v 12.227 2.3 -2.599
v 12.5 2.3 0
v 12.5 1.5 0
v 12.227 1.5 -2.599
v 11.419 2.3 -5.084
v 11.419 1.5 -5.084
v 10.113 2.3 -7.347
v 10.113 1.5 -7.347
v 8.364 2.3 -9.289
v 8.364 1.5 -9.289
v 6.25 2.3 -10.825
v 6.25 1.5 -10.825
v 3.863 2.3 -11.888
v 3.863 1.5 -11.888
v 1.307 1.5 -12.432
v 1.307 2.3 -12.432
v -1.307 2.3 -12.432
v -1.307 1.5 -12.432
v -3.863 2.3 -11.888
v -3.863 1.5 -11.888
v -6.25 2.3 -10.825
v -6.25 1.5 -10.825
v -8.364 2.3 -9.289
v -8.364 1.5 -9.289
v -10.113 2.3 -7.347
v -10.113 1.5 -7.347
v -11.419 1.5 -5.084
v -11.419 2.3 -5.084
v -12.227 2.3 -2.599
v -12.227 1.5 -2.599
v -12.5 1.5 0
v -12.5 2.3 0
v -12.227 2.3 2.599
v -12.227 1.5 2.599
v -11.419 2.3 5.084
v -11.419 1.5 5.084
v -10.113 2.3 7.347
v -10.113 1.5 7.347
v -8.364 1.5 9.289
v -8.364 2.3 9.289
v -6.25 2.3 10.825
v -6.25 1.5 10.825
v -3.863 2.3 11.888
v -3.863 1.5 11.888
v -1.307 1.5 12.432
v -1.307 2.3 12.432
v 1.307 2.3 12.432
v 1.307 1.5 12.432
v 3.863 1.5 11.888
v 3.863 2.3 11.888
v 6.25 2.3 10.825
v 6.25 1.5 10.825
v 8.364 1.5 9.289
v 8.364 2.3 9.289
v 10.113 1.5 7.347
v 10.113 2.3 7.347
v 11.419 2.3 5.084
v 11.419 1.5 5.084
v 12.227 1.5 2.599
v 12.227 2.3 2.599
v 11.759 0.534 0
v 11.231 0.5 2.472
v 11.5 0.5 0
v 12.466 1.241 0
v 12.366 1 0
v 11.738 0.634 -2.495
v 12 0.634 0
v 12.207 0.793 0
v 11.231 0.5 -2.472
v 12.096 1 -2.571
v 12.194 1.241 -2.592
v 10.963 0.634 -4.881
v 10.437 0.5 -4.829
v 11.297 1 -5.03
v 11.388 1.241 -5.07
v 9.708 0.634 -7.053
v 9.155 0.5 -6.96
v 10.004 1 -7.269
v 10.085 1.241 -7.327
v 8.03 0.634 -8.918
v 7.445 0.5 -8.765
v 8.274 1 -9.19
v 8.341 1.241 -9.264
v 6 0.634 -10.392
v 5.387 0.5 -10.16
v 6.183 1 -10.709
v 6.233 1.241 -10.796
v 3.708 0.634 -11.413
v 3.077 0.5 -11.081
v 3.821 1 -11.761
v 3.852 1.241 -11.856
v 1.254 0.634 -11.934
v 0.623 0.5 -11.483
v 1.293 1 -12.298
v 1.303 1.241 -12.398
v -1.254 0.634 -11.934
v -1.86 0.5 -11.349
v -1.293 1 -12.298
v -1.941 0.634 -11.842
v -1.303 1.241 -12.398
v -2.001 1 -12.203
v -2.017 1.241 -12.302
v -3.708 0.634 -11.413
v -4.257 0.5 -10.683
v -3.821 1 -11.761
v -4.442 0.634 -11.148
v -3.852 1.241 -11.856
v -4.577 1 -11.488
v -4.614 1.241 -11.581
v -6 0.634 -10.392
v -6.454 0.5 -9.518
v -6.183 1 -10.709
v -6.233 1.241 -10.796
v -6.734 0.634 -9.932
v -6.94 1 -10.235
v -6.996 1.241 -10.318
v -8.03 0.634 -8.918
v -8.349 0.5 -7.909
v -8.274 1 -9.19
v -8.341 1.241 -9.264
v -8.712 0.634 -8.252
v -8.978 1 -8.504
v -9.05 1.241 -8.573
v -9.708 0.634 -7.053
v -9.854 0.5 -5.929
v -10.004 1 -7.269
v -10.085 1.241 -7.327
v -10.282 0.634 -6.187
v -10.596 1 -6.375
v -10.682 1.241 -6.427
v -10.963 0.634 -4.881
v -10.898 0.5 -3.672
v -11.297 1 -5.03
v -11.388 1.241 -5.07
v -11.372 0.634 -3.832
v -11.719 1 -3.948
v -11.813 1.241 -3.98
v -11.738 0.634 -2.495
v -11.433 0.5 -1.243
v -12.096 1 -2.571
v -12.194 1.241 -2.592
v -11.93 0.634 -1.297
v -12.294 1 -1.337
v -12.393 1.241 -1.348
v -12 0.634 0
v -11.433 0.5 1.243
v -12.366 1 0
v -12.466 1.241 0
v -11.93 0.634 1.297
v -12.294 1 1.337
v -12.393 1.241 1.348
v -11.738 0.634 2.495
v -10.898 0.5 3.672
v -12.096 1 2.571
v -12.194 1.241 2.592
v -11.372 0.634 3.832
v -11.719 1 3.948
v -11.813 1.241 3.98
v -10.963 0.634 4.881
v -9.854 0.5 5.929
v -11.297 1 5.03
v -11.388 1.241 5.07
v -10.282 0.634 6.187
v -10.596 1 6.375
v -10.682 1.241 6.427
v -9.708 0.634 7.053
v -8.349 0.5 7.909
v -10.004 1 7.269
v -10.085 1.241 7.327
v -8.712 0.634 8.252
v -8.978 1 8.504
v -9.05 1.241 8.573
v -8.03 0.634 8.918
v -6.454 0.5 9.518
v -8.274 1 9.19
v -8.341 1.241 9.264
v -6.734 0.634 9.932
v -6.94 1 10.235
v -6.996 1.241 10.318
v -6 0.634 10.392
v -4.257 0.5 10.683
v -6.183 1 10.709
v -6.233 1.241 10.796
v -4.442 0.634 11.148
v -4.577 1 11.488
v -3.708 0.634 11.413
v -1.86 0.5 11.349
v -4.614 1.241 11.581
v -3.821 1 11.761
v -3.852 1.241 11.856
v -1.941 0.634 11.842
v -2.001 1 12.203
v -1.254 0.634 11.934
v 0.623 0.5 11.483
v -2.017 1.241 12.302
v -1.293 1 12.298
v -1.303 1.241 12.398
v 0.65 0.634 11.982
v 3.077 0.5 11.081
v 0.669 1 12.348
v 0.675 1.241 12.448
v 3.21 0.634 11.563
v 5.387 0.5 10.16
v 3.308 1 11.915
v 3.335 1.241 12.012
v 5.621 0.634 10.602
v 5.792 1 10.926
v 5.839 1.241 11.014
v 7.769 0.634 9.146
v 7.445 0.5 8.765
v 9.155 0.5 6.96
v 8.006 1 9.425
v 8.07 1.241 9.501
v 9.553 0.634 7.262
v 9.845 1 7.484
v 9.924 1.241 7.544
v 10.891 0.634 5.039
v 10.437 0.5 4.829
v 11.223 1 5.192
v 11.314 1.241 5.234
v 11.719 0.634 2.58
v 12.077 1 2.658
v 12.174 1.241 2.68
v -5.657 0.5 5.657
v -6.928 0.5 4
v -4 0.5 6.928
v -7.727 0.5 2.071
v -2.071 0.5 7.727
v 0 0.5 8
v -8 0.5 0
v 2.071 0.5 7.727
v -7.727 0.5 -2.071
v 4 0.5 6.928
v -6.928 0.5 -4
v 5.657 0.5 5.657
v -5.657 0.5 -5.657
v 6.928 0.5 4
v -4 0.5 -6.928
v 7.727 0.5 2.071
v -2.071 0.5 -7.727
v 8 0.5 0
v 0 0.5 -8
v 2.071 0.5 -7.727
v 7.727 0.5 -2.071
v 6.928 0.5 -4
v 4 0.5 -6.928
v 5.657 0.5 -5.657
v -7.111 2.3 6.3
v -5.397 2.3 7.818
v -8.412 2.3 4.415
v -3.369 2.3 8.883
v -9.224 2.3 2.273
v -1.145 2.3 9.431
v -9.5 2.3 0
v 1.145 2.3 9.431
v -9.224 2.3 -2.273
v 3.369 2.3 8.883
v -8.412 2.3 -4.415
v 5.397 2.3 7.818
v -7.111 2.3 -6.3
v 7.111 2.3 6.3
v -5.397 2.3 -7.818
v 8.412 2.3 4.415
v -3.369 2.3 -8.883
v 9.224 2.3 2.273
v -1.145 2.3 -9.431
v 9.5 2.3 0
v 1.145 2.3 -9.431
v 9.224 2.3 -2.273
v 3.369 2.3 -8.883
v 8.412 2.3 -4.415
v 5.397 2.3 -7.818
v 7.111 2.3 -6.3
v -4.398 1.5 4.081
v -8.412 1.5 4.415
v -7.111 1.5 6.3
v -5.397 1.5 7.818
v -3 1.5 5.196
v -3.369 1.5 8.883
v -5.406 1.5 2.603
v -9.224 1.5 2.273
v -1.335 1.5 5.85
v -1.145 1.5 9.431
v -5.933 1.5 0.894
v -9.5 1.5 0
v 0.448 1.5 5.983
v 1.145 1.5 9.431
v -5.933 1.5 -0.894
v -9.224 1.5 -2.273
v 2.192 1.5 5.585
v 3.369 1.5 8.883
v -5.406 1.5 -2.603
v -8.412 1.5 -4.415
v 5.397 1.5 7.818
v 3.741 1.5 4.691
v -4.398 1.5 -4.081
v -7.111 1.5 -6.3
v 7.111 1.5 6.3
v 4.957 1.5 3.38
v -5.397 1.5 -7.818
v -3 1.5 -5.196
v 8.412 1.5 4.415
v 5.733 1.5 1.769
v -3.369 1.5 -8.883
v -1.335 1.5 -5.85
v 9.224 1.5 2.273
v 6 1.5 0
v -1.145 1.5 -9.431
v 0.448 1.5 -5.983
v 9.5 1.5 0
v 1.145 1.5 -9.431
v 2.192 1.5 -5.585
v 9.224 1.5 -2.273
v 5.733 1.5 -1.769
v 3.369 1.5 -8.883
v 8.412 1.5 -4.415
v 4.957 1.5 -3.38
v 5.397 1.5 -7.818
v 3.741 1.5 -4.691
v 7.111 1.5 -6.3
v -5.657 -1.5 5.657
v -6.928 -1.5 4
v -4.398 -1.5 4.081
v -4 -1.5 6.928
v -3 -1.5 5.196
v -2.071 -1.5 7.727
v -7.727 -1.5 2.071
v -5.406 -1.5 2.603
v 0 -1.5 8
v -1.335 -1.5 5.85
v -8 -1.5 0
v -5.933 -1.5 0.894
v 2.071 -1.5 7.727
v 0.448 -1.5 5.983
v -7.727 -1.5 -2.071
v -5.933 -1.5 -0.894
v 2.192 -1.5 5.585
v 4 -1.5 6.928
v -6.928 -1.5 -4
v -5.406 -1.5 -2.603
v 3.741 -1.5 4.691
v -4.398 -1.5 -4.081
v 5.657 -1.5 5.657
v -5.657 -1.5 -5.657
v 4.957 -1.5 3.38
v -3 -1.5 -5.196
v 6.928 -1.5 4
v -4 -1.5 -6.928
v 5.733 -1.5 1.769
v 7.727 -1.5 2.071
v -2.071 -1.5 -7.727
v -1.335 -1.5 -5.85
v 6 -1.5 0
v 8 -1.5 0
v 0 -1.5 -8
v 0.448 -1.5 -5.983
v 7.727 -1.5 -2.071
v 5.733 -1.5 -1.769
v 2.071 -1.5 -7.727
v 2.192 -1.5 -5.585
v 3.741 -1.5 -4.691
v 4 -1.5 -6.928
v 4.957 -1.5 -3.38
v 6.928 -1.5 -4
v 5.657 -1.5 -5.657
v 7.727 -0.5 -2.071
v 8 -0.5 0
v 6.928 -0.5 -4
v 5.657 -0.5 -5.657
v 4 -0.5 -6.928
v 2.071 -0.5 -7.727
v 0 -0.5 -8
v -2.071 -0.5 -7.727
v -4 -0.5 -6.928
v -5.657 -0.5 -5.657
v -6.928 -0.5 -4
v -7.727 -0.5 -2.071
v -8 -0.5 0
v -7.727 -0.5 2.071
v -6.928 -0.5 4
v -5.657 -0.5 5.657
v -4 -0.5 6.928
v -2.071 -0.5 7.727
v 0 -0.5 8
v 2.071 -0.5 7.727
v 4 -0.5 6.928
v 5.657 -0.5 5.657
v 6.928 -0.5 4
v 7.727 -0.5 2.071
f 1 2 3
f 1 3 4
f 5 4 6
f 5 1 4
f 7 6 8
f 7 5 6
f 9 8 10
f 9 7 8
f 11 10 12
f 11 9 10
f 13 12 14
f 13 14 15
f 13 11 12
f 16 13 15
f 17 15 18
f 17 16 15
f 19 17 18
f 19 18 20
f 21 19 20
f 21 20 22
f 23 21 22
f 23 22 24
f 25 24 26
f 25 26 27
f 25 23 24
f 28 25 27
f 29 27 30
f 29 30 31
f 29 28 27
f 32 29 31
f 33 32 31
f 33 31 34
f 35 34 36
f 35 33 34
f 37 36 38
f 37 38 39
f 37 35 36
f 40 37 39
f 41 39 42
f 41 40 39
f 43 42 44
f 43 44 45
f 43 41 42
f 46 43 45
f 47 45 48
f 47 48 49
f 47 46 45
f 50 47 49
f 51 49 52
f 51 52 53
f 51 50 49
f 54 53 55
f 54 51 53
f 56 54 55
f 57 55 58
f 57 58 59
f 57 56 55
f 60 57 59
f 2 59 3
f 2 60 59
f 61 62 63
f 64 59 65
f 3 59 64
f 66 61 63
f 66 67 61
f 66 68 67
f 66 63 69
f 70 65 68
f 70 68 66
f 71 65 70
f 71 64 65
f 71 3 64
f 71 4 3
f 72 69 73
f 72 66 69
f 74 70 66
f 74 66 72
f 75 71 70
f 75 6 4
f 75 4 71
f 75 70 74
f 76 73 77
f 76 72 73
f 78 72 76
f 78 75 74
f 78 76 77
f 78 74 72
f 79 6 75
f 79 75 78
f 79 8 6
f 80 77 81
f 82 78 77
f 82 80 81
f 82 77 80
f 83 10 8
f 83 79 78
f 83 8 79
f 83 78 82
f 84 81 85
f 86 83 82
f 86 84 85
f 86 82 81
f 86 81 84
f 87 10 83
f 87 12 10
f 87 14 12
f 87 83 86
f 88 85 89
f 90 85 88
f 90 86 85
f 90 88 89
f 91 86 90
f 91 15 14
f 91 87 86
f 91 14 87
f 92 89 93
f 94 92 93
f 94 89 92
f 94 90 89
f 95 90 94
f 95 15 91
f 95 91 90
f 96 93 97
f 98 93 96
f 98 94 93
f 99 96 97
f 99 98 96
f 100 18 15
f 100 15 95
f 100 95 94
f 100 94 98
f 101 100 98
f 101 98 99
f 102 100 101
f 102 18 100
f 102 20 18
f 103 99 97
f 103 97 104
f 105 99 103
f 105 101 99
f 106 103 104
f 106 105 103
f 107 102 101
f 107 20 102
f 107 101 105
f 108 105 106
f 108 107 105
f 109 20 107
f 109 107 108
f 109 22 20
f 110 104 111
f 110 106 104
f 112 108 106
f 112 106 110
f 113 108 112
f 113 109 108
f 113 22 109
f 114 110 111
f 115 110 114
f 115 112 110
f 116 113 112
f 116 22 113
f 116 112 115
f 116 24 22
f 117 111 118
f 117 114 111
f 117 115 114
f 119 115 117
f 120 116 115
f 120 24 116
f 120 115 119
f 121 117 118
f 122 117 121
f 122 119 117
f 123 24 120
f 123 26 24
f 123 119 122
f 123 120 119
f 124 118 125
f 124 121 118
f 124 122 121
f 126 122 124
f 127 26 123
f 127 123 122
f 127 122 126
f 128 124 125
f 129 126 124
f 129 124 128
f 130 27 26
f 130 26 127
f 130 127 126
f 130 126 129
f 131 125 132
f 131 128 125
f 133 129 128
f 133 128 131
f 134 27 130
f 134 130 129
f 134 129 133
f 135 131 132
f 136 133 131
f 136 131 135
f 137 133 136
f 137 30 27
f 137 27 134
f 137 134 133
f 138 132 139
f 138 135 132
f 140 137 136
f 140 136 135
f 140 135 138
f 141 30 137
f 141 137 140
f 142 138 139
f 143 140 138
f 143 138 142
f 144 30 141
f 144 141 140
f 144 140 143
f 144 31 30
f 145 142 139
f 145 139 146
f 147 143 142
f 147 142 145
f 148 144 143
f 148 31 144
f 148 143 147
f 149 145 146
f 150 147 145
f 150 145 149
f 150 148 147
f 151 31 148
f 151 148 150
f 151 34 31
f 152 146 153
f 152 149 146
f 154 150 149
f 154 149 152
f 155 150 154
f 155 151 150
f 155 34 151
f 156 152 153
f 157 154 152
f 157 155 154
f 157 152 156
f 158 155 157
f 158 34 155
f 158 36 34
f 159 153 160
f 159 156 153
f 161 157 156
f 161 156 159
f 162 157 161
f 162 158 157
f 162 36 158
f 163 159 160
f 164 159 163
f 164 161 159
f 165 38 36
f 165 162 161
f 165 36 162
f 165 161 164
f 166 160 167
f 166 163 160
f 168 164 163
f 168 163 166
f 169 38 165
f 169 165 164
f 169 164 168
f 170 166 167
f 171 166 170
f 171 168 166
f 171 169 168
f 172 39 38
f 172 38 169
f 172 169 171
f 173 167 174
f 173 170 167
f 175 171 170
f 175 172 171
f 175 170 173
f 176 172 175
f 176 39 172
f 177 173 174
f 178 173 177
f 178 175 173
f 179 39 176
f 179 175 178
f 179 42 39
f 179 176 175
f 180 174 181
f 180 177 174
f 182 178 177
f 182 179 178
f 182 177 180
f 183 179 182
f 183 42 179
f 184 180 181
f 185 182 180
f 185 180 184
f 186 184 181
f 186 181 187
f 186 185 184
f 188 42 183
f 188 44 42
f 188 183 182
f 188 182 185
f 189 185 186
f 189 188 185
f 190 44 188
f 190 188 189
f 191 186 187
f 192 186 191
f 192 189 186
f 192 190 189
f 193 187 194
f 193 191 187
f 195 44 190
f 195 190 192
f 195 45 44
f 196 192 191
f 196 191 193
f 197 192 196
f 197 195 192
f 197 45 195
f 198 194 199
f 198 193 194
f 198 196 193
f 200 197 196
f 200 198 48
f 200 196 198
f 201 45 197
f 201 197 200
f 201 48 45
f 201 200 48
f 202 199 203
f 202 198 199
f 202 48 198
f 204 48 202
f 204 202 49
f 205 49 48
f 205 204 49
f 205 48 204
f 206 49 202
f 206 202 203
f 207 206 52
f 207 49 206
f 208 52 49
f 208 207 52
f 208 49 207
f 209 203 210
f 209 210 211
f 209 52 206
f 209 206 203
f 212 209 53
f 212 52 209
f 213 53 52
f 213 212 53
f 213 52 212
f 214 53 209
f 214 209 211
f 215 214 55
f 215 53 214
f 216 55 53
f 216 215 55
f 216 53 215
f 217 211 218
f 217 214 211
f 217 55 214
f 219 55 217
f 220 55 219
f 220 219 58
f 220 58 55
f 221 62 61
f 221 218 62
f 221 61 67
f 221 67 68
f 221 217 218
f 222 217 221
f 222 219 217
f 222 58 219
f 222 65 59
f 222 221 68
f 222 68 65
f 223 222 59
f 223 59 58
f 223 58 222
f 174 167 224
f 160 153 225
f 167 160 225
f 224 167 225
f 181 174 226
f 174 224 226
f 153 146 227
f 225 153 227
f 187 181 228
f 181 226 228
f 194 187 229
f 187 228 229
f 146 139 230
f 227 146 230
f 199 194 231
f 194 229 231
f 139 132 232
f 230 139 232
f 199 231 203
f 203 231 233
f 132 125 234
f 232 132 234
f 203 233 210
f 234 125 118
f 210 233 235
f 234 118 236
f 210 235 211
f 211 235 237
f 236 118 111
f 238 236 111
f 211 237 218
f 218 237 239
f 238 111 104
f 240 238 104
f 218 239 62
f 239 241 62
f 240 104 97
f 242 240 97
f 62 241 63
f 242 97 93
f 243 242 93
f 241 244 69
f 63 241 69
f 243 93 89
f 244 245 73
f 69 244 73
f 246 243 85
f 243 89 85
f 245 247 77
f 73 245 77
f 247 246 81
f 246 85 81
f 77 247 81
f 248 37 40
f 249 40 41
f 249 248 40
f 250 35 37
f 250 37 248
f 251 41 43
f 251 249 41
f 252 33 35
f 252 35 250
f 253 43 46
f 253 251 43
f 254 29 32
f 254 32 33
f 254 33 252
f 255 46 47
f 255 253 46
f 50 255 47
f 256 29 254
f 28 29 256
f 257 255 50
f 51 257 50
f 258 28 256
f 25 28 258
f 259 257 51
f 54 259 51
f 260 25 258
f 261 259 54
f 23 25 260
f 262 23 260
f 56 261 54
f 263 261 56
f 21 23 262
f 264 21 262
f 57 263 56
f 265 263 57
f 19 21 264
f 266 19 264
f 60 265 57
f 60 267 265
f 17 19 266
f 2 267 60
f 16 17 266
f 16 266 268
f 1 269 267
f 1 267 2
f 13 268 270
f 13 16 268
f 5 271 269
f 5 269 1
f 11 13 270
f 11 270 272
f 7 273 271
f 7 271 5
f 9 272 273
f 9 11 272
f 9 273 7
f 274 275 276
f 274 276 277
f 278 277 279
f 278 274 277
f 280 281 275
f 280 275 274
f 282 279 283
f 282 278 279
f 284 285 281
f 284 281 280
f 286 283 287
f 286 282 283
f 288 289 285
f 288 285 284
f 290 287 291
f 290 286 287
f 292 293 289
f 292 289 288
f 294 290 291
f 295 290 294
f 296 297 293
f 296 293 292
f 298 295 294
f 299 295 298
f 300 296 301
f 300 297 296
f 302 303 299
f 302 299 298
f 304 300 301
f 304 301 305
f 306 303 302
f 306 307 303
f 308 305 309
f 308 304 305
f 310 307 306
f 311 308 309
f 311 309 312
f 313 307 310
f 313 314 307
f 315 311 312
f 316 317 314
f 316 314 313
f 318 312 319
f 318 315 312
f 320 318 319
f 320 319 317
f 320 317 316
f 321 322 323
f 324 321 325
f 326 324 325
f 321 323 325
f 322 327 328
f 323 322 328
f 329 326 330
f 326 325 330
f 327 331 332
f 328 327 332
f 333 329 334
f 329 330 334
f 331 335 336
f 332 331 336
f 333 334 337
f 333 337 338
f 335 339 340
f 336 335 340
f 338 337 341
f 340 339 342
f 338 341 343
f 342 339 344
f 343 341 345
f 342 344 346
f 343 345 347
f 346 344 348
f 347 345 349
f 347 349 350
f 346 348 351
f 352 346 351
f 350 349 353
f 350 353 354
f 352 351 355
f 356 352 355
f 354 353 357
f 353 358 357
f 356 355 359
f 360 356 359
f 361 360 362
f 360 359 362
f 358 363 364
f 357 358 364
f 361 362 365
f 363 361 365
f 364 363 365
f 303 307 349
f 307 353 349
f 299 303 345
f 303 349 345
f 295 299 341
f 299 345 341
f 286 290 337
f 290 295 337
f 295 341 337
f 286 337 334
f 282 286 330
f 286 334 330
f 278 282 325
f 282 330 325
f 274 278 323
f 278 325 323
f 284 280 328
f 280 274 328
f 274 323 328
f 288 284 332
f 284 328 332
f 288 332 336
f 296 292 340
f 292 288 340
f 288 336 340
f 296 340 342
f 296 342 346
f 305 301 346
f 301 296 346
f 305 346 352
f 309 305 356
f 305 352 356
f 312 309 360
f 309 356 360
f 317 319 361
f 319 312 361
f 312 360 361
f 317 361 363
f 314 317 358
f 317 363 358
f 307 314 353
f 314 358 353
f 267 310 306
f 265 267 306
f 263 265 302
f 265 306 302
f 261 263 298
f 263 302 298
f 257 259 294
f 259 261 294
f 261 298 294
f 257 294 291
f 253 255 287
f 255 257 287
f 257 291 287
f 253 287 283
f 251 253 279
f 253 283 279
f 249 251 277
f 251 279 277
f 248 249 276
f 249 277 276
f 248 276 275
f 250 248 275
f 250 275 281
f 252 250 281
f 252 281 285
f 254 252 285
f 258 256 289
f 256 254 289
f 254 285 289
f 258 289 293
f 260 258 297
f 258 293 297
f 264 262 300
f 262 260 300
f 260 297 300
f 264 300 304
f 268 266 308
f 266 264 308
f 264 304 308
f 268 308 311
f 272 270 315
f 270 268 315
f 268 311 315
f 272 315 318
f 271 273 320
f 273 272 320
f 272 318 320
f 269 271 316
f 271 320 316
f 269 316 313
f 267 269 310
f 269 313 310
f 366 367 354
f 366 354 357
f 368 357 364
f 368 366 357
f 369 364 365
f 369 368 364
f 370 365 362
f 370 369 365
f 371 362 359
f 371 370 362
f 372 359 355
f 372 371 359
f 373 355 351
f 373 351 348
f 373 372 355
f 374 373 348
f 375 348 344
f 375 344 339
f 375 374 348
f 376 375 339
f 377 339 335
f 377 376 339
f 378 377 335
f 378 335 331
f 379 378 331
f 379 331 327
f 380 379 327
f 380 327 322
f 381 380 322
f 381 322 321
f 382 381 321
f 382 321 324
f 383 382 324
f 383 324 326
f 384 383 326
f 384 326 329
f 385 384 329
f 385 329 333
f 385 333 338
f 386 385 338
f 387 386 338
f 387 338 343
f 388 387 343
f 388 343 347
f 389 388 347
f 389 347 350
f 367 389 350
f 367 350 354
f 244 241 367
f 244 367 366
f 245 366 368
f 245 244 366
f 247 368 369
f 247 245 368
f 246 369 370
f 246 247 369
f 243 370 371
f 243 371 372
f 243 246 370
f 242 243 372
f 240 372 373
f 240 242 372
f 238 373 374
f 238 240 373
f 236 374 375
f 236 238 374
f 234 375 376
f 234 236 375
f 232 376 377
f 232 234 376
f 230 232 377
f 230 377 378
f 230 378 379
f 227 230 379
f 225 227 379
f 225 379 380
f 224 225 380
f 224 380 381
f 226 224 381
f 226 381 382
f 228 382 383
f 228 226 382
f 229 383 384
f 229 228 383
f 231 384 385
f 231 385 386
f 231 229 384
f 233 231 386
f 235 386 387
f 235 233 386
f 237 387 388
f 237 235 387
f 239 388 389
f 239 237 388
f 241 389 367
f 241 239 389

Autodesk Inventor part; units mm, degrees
ref_plane "YZ Plane" through (0, 0, 0) normal (1, 0, 0) x (0, 1, 0)
ref_plane "XZ Plane" through (0, 0, 0) normal (0, 1, 0) x (-1, 0, 0)
ref_plane "XY Plane" through (0, 0, 0) normal (0, 0, 1) x (1, 0, 0)
sketch "Sketch1" plane through (0, 0, 0) normal (0, 0, 1) x (1, 0, 0)
  line L0 (6, 1.5) -> (6, -1.5)
  line L1 (8, 0.5) -> (11.5, 0.5)
  line L2 (12.5, 1.5) -> (12.5, 2.3)
  line L3 (12.5, 1.5) -> (11.5, 1.5) construction
  line L4 (11.5, 1.5) -> (11.5, 0.5) construction
  arc A0 (11.5, 0.5) -> (12.5, 1.5) centre (11.5, 1.5) ccw
  line L5 (6, 1.5) -> (9.5, 1.5)
  line L6 (12.5, 2.3) -> (9.5, 2.3)
  line L7 (9.5, 2.3) -> (9.5, 1.5)
  line L8 (8, -0.5) -> (8, 0.5)
  line L9 (8, -1.5) -> (8, -0.5)
  line L10 (0, 0) -> (0, 11.9081) construction
  line L11 (8, -1.5) -> (6, -1.5)
  dimension "d0" = 3
  dimension "d1" = 1.5
  dimension "d2" = 0.8
  dimension "d3" = 1
  dimension "d4" = 1
  dimension "d5" = 3
  dimension "d6" = 6
  dimension "d7" = 0.8
  dimension "d8" = 3.5
revolve "Revolution1" add sketch "Sketch1" angle 360 about axis through (0, 0, 0) along (0, 1, 0)
equation "\"d1\" = 0.5 * d0"
equation "\"d4\" = d3"
properties part number "tarcza sprzęgła 2"
